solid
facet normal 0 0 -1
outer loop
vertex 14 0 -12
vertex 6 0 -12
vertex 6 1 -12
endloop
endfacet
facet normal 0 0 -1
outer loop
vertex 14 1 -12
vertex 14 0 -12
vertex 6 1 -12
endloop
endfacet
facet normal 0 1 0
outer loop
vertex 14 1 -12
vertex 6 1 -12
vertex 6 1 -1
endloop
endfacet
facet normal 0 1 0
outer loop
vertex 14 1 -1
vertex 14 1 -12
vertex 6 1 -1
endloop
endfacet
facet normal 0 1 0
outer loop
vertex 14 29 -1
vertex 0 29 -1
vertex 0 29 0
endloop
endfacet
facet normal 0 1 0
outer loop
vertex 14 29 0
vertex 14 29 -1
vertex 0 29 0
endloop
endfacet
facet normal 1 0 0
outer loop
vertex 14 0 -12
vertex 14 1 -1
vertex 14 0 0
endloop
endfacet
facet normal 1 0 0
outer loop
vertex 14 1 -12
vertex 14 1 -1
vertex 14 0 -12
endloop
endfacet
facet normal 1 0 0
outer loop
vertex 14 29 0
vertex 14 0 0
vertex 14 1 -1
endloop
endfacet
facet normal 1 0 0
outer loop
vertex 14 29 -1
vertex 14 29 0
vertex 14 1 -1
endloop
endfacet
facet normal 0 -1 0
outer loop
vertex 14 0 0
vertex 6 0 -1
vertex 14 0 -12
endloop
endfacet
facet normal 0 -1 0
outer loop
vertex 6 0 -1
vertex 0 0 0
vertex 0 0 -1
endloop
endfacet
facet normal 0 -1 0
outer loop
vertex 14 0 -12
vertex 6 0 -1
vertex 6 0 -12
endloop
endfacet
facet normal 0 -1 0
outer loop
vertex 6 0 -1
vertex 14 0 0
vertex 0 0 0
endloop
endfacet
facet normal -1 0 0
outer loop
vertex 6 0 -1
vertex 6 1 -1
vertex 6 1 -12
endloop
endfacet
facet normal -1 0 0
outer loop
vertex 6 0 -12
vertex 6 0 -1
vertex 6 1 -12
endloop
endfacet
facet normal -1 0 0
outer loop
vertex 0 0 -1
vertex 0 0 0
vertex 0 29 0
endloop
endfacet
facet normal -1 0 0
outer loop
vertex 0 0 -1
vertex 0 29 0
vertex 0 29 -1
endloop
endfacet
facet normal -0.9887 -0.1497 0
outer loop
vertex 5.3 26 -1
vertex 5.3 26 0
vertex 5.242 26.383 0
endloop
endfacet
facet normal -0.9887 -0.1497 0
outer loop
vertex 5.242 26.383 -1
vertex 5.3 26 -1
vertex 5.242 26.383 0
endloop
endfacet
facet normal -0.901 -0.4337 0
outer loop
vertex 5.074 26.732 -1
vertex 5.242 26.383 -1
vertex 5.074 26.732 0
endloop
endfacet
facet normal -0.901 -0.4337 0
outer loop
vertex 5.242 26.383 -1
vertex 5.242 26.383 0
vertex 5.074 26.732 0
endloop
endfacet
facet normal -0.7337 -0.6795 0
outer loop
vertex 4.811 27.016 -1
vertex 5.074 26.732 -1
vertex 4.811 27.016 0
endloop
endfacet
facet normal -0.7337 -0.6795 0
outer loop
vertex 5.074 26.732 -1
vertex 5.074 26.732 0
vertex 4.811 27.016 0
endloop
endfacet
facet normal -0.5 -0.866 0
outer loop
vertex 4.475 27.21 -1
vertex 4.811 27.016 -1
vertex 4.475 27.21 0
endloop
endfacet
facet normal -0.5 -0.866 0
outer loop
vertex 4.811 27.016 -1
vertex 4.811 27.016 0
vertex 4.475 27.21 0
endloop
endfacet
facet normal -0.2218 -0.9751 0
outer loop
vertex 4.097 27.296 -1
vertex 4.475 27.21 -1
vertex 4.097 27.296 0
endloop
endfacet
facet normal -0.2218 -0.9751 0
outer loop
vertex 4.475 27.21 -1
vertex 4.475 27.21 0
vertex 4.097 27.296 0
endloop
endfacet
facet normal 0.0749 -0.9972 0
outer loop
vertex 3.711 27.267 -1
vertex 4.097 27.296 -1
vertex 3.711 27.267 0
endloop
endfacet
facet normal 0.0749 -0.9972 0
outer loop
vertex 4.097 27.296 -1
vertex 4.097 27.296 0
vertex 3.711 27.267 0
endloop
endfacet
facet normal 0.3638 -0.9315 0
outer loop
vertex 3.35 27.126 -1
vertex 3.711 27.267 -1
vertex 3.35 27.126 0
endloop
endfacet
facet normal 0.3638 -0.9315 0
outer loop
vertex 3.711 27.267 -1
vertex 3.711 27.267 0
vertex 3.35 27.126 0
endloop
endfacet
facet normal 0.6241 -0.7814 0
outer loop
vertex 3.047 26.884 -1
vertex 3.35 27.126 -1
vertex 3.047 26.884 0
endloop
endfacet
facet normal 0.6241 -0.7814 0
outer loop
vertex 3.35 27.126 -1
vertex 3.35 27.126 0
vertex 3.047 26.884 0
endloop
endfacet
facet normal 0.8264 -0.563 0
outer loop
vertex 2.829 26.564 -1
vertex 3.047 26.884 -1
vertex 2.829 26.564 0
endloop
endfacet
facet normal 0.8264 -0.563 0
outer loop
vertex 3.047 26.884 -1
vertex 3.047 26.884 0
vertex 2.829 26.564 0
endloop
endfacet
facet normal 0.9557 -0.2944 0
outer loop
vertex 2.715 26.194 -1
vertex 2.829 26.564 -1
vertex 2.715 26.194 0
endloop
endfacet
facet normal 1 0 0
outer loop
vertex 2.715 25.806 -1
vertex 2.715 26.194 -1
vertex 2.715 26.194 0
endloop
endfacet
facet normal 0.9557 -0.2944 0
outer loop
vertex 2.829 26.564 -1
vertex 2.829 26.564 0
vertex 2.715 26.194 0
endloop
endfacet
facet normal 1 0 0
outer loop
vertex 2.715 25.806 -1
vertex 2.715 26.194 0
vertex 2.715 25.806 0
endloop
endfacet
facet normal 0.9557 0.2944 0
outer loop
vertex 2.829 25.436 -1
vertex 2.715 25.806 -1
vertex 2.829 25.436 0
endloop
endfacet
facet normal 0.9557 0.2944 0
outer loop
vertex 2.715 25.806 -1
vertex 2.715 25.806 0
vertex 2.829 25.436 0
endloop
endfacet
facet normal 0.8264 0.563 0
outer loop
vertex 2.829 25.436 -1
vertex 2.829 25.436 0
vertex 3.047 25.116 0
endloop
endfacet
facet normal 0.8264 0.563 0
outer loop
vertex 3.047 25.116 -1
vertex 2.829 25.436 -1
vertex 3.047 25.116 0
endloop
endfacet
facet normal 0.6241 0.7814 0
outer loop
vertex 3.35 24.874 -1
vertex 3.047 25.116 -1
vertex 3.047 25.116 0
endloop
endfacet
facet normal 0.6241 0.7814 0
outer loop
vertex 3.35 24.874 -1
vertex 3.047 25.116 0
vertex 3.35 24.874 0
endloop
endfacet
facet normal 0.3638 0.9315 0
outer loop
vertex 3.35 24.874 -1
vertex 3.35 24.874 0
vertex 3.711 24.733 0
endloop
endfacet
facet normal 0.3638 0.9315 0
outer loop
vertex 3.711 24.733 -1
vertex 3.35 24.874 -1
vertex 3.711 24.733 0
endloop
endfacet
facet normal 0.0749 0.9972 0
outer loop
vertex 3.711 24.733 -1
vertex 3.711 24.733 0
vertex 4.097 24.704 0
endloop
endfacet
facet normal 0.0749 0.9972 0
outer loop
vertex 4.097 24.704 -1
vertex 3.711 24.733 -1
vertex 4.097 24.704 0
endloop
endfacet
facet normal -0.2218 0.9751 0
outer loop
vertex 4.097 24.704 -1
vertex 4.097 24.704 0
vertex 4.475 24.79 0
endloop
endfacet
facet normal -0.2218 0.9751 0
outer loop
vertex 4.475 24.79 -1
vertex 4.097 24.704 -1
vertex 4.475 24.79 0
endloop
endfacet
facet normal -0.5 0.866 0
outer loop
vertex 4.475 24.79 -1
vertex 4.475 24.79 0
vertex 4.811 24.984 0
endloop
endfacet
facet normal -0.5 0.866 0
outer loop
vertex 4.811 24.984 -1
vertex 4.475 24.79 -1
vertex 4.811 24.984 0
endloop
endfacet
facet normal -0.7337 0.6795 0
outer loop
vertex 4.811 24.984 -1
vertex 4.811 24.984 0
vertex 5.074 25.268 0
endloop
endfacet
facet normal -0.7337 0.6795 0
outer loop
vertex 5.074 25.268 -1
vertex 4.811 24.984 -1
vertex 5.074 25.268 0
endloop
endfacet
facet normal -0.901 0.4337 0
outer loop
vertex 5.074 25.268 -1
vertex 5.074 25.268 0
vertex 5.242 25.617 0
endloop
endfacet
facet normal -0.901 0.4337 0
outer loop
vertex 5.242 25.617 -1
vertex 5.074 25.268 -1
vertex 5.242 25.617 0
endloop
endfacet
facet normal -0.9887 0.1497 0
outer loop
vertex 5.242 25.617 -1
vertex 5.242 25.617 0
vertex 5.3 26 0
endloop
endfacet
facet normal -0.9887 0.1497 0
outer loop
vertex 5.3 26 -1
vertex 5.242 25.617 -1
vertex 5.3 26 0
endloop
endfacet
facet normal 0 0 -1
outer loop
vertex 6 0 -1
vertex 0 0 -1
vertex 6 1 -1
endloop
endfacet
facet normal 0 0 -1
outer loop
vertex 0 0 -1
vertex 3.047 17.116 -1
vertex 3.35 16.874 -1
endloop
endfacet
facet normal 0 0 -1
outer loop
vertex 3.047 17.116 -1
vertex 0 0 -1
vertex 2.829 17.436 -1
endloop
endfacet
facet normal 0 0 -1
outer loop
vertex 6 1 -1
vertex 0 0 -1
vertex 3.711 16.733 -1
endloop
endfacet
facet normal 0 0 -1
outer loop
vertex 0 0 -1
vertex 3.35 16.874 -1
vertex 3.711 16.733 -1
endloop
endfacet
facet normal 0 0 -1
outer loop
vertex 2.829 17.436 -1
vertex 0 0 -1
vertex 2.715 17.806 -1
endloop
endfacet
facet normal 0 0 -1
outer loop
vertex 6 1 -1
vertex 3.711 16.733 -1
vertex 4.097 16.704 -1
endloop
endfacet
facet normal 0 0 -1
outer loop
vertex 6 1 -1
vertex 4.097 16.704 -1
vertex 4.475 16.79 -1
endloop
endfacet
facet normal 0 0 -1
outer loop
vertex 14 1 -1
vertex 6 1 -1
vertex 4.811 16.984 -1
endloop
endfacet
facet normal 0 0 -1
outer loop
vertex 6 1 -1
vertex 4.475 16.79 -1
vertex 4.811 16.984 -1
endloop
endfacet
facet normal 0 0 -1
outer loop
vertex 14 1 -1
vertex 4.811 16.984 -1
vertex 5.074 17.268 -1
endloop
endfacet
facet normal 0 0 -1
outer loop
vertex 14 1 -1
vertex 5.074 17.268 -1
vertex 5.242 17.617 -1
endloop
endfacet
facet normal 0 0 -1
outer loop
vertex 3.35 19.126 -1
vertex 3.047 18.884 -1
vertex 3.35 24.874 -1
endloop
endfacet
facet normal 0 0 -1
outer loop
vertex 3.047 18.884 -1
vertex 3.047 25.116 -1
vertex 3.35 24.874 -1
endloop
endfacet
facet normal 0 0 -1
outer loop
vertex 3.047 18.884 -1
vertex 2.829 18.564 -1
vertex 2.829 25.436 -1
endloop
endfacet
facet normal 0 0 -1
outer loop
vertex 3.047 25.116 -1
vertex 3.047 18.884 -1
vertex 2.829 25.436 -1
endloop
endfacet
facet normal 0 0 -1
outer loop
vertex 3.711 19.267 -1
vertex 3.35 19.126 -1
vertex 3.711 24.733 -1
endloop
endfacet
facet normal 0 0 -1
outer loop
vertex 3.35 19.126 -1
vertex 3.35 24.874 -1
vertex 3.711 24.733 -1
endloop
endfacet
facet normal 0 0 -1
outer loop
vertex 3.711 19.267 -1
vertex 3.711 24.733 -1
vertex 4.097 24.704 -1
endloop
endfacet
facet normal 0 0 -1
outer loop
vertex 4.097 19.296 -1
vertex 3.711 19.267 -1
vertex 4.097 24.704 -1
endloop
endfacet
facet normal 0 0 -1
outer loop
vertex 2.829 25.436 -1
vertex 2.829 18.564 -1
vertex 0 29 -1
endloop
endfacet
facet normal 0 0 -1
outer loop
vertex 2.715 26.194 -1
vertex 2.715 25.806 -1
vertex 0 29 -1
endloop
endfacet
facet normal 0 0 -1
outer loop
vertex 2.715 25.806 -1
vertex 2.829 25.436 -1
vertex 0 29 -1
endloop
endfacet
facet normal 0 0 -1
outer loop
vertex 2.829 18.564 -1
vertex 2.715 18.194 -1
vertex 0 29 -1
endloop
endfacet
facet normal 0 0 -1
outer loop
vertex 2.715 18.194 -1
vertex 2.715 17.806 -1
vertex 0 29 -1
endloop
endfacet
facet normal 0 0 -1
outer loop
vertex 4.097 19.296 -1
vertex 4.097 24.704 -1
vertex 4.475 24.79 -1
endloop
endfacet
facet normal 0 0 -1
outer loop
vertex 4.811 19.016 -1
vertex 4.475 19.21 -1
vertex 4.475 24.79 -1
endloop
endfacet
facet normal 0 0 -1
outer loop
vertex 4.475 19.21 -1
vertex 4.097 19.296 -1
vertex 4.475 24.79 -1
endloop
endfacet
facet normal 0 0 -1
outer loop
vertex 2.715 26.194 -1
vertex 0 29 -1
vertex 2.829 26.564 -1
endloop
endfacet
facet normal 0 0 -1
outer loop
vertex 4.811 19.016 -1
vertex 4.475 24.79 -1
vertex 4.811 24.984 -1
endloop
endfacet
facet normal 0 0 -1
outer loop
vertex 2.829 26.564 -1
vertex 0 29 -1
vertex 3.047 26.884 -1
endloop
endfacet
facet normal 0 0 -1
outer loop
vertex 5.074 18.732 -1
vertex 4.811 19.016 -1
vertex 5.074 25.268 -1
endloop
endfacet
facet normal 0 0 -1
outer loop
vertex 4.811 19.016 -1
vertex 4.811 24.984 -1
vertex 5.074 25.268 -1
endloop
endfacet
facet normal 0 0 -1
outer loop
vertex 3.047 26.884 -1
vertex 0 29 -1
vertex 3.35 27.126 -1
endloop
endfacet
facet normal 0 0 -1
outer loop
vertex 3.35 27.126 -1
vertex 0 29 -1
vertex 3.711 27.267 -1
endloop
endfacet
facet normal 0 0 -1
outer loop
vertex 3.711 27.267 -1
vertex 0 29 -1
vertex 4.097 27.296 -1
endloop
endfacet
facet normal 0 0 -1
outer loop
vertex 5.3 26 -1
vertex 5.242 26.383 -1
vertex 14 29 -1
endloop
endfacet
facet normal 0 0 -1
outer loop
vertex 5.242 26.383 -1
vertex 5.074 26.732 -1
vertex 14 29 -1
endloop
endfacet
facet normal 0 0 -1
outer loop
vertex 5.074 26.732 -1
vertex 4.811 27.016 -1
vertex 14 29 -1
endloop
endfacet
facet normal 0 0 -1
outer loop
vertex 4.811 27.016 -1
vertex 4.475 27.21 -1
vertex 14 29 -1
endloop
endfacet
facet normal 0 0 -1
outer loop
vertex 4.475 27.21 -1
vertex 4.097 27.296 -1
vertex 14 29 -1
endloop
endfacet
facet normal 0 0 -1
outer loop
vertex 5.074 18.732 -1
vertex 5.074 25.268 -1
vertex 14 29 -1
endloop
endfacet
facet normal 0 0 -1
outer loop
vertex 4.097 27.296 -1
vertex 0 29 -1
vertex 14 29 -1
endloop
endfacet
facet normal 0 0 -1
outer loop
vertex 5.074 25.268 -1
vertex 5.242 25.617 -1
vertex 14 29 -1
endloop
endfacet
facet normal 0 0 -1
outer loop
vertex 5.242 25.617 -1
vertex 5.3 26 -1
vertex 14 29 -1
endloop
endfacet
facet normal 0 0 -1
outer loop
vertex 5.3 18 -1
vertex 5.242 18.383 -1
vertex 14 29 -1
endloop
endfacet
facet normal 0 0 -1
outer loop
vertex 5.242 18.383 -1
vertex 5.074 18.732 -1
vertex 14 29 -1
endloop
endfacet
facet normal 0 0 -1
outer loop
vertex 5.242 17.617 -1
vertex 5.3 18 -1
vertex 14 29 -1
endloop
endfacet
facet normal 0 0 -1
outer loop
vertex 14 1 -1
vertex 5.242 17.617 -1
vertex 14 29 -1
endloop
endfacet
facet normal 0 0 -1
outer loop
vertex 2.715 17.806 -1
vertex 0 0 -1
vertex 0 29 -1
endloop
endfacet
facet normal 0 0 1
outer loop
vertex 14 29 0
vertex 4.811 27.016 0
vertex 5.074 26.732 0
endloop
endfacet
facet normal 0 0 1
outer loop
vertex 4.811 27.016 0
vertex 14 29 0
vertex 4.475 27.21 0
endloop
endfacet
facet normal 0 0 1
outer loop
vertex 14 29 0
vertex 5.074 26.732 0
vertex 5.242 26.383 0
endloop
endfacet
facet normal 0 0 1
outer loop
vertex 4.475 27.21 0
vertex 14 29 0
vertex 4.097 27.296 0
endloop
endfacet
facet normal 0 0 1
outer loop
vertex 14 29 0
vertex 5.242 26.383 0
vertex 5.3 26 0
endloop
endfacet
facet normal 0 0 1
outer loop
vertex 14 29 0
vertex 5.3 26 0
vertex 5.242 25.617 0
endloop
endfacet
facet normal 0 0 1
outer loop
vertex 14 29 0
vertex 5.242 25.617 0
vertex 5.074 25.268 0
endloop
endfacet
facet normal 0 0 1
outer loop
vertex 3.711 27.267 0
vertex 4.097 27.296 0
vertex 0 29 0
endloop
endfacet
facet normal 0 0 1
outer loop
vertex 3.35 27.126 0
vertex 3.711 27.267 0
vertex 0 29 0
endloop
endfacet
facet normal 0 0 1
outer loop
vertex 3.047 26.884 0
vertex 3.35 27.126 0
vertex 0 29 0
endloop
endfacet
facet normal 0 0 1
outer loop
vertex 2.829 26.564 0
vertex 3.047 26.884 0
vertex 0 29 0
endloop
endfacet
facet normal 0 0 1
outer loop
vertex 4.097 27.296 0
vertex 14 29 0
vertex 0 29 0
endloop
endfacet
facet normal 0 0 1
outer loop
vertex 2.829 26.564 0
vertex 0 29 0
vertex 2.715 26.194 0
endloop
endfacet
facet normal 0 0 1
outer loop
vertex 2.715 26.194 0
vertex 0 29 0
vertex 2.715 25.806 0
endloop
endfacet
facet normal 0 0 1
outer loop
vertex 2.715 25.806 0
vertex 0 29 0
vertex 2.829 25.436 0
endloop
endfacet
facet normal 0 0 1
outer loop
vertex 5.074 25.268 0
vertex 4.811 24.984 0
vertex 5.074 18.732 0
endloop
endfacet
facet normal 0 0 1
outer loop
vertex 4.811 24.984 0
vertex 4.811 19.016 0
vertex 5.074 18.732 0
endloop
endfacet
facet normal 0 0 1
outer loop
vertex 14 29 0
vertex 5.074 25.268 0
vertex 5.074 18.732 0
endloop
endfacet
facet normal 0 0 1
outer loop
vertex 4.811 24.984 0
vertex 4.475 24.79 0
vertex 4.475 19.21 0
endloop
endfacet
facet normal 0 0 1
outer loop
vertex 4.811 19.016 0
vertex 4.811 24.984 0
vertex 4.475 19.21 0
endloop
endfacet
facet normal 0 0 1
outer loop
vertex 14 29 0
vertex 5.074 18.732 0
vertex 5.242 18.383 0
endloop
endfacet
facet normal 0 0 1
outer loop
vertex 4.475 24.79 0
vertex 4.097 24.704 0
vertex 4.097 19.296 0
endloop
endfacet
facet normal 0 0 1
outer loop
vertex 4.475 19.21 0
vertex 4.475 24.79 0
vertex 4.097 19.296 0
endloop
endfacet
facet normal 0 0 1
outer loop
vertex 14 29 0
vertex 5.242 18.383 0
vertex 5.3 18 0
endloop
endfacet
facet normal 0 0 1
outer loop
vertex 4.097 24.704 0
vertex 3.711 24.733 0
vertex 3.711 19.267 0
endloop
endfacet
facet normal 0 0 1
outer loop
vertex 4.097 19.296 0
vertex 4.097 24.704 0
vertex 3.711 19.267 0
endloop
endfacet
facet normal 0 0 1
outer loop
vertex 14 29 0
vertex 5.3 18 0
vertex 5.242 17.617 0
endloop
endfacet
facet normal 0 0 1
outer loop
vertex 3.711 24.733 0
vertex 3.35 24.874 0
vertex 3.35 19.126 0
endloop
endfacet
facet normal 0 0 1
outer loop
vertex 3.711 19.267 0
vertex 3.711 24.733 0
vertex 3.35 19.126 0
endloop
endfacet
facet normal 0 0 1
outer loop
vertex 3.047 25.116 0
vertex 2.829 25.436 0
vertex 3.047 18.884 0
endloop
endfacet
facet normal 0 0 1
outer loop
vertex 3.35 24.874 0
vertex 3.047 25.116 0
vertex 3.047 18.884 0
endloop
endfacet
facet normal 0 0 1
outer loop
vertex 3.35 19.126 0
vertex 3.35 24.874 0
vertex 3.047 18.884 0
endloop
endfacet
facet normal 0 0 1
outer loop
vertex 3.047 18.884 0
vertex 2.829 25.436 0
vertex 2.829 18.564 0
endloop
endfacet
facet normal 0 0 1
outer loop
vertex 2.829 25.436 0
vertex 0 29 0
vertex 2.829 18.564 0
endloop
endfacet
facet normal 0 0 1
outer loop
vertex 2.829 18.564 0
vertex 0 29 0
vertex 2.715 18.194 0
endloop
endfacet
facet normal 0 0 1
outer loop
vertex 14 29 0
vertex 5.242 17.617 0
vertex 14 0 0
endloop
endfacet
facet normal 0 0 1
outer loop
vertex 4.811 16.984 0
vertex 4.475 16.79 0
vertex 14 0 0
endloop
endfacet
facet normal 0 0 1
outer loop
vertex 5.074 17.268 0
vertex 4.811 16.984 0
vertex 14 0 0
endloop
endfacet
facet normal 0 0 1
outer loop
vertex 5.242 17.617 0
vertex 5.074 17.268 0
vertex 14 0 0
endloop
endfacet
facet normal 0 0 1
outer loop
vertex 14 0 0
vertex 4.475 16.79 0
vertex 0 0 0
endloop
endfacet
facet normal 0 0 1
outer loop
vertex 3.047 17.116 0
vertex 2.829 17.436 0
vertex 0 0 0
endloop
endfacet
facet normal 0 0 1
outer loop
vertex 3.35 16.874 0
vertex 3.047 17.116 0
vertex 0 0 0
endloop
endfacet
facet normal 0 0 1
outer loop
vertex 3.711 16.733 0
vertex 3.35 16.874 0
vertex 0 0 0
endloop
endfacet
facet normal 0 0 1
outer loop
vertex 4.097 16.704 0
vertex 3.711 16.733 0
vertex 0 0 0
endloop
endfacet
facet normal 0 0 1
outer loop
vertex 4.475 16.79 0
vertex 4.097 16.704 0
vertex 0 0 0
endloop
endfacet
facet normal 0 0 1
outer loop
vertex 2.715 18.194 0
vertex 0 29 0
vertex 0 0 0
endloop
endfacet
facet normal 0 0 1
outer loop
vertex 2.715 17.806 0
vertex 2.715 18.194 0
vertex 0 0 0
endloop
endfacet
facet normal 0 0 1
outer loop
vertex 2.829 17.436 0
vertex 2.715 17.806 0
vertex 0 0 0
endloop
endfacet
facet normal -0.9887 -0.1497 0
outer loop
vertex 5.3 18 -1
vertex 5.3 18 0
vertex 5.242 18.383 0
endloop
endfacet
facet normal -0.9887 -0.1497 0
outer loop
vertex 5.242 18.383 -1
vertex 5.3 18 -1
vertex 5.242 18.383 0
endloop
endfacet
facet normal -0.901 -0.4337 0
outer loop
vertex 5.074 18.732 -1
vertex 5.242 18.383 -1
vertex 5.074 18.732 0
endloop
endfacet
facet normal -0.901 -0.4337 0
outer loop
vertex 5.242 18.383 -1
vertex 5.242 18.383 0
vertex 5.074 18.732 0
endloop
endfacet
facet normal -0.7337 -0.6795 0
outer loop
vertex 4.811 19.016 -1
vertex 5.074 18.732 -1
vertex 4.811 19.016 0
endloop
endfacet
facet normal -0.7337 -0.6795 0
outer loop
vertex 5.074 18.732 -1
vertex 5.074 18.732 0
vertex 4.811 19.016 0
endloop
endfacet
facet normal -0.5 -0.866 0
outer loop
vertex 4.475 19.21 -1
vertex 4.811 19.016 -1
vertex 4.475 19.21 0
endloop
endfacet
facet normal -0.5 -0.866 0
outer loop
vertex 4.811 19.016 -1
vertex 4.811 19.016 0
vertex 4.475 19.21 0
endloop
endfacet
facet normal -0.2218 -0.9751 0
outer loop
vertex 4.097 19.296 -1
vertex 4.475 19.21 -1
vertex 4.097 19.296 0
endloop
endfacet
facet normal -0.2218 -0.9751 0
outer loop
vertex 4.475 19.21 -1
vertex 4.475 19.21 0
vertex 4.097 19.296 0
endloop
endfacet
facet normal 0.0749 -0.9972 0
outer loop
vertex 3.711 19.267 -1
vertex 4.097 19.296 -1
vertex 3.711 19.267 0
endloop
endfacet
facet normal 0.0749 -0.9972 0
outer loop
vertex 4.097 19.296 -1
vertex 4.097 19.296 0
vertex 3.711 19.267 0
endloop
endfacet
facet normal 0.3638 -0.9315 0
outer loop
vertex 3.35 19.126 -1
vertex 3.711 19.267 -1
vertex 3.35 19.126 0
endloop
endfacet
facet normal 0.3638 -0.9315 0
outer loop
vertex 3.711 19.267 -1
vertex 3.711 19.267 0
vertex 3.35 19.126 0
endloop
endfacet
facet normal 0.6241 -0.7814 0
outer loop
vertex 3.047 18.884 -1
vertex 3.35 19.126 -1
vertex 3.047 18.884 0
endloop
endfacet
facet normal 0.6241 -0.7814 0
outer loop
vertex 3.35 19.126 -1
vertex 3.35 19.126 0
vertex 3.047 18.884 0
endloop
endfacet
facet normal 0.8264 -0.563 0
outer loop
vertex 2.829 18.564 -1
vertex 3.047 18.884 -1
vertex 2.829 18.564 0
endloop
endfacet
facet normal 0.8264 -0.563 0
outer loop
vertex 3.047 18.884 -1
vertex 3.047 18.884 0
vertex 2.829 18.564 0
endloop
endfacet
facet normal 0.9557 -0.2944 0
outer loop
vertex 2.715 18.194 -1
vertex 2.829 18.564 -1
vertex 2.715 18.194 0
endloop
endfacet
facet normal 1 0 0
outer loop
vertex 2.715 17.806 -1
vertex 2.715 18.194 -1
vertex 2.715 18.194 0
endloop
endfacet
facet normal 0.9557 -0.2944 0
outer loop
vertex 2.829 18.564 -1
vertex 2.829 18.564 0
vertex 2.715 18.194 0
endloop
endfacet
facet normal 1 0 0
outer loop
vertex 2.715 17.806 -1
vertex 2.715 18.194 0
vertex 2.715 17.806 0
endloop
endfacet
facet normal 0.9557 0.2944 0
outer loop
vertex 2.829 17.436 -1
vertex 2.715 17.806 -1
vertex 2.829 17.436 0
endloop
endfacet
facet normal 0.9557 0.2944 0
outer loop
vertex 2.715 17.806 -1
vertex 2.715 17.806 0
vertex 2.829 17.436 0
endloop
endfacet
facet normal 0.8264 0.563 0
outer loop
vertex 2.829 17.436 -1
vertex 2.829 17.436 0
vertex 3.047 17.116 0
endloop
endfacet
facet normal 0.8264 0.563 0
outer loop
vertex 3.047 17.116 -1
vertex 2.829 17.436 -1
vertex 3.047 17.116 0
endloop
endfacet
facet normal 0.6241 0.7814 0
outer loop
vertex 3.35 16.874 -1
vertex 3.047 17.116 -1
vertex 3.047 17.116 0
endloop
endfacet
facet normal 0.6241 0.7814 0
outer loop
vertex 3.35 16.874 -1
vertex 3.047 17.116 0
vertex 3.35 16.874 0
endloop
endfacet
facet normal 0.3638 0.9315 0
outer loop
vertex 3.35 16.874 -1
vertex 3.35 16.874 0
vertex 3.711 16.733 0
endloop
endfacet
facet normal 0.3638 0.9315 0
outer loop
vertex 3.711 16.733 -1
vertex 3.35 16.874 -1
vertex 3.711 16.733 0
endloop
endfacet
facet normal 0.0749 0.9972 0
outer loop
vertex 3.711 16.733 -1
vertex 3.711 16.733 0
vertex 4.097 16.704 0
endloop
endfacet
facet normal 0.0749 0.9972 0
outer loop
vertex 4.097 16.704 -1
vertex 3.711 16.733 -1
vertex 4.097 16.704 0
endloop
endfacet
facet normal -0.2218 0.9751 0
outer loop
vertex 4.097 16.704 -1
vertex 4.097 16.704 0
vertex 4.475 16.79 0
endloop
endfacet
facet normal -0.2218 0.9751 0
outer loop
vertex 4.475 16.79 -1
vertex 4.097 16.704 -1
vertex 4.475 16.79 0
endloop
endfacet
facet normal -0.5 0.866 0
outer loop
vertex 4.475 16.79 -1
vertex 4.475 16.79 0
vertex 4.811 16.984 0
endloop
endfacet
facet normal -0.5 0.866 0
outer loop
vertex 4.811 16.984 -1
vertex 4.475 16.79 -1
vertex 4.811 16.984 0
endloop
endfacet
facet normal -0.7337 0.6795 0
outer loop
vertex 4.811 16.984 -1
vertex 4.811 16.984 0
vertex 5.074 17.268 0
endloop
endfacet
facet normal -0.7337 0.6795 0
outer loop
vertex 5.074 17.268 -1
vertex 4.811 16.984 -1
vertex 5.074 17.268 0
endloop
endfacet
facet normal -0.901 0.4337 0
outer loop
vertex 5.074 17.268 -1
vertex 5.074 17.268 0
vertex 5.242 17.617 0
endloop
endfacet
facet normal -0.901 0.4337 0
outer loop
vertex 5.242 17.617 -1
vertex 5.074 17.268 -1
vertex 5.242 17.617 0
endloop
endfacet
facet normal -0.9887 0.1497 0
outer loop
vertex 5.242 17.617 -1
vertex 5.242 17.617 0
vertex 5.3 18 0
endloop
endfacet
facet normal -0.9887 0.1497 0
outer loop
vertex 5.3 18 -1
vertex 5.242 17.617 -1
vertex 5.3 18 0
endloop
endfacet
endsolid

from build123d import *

# Parameters (mm, degrees)
EXTRUDE_1_DEPTH     = 14
SKETCH_2_R          = 1.3
CUT_EXTRUDE_1_DEPTH = 35.365680555
SKETCH_4_W          = 6
SKETCH_4_H          = 11
CUT_EXTRUDE_3_DEPTH = 34.526109228


with BuildPart() as part:
    # 草圖1 → 填料-伸長1 (new body)
    with BuildSketch(Plane(origin=(0, 0, 0), x_dir=(0, 0, -1), z_dir=(1, 0, 0))):
        Polygon((0, 0), (12, 0), (12, 1), (1, 1), (1, 29), (0, 29), align=None)
    extrude(amount=EXTRUDE_1_DEPTH)

    # 草圖2 → 除料-伸長1 (cut, through all)
    with BuildSketch(Plane.XY):
        with Locations((4, 26)):
            Circle(SKETCH_2_R)
        with Locations((4, 18)):
            Circle(SKETCH_2_R)
    extrude(amount=-CUT_EXTRUDE_1_DEPTH, mode=Mode.SUBTRACT)

    # 草圖4 → 除料-伸長3 (cut, through all)
    with BuildSketch(Plane(origin=(0, 1, 0), x_dir=(1, 0, 0), z_dir=(0, 1, 0))):
        with Locations((3, 6.5)):
            Rectangle(SKETCH_4_W, SKETCH_4_H)
    extrude(amount=-CUT_EXTRUDE_3_DEPTH, mode=Mode.SUBTRACT)


solid = part.part
